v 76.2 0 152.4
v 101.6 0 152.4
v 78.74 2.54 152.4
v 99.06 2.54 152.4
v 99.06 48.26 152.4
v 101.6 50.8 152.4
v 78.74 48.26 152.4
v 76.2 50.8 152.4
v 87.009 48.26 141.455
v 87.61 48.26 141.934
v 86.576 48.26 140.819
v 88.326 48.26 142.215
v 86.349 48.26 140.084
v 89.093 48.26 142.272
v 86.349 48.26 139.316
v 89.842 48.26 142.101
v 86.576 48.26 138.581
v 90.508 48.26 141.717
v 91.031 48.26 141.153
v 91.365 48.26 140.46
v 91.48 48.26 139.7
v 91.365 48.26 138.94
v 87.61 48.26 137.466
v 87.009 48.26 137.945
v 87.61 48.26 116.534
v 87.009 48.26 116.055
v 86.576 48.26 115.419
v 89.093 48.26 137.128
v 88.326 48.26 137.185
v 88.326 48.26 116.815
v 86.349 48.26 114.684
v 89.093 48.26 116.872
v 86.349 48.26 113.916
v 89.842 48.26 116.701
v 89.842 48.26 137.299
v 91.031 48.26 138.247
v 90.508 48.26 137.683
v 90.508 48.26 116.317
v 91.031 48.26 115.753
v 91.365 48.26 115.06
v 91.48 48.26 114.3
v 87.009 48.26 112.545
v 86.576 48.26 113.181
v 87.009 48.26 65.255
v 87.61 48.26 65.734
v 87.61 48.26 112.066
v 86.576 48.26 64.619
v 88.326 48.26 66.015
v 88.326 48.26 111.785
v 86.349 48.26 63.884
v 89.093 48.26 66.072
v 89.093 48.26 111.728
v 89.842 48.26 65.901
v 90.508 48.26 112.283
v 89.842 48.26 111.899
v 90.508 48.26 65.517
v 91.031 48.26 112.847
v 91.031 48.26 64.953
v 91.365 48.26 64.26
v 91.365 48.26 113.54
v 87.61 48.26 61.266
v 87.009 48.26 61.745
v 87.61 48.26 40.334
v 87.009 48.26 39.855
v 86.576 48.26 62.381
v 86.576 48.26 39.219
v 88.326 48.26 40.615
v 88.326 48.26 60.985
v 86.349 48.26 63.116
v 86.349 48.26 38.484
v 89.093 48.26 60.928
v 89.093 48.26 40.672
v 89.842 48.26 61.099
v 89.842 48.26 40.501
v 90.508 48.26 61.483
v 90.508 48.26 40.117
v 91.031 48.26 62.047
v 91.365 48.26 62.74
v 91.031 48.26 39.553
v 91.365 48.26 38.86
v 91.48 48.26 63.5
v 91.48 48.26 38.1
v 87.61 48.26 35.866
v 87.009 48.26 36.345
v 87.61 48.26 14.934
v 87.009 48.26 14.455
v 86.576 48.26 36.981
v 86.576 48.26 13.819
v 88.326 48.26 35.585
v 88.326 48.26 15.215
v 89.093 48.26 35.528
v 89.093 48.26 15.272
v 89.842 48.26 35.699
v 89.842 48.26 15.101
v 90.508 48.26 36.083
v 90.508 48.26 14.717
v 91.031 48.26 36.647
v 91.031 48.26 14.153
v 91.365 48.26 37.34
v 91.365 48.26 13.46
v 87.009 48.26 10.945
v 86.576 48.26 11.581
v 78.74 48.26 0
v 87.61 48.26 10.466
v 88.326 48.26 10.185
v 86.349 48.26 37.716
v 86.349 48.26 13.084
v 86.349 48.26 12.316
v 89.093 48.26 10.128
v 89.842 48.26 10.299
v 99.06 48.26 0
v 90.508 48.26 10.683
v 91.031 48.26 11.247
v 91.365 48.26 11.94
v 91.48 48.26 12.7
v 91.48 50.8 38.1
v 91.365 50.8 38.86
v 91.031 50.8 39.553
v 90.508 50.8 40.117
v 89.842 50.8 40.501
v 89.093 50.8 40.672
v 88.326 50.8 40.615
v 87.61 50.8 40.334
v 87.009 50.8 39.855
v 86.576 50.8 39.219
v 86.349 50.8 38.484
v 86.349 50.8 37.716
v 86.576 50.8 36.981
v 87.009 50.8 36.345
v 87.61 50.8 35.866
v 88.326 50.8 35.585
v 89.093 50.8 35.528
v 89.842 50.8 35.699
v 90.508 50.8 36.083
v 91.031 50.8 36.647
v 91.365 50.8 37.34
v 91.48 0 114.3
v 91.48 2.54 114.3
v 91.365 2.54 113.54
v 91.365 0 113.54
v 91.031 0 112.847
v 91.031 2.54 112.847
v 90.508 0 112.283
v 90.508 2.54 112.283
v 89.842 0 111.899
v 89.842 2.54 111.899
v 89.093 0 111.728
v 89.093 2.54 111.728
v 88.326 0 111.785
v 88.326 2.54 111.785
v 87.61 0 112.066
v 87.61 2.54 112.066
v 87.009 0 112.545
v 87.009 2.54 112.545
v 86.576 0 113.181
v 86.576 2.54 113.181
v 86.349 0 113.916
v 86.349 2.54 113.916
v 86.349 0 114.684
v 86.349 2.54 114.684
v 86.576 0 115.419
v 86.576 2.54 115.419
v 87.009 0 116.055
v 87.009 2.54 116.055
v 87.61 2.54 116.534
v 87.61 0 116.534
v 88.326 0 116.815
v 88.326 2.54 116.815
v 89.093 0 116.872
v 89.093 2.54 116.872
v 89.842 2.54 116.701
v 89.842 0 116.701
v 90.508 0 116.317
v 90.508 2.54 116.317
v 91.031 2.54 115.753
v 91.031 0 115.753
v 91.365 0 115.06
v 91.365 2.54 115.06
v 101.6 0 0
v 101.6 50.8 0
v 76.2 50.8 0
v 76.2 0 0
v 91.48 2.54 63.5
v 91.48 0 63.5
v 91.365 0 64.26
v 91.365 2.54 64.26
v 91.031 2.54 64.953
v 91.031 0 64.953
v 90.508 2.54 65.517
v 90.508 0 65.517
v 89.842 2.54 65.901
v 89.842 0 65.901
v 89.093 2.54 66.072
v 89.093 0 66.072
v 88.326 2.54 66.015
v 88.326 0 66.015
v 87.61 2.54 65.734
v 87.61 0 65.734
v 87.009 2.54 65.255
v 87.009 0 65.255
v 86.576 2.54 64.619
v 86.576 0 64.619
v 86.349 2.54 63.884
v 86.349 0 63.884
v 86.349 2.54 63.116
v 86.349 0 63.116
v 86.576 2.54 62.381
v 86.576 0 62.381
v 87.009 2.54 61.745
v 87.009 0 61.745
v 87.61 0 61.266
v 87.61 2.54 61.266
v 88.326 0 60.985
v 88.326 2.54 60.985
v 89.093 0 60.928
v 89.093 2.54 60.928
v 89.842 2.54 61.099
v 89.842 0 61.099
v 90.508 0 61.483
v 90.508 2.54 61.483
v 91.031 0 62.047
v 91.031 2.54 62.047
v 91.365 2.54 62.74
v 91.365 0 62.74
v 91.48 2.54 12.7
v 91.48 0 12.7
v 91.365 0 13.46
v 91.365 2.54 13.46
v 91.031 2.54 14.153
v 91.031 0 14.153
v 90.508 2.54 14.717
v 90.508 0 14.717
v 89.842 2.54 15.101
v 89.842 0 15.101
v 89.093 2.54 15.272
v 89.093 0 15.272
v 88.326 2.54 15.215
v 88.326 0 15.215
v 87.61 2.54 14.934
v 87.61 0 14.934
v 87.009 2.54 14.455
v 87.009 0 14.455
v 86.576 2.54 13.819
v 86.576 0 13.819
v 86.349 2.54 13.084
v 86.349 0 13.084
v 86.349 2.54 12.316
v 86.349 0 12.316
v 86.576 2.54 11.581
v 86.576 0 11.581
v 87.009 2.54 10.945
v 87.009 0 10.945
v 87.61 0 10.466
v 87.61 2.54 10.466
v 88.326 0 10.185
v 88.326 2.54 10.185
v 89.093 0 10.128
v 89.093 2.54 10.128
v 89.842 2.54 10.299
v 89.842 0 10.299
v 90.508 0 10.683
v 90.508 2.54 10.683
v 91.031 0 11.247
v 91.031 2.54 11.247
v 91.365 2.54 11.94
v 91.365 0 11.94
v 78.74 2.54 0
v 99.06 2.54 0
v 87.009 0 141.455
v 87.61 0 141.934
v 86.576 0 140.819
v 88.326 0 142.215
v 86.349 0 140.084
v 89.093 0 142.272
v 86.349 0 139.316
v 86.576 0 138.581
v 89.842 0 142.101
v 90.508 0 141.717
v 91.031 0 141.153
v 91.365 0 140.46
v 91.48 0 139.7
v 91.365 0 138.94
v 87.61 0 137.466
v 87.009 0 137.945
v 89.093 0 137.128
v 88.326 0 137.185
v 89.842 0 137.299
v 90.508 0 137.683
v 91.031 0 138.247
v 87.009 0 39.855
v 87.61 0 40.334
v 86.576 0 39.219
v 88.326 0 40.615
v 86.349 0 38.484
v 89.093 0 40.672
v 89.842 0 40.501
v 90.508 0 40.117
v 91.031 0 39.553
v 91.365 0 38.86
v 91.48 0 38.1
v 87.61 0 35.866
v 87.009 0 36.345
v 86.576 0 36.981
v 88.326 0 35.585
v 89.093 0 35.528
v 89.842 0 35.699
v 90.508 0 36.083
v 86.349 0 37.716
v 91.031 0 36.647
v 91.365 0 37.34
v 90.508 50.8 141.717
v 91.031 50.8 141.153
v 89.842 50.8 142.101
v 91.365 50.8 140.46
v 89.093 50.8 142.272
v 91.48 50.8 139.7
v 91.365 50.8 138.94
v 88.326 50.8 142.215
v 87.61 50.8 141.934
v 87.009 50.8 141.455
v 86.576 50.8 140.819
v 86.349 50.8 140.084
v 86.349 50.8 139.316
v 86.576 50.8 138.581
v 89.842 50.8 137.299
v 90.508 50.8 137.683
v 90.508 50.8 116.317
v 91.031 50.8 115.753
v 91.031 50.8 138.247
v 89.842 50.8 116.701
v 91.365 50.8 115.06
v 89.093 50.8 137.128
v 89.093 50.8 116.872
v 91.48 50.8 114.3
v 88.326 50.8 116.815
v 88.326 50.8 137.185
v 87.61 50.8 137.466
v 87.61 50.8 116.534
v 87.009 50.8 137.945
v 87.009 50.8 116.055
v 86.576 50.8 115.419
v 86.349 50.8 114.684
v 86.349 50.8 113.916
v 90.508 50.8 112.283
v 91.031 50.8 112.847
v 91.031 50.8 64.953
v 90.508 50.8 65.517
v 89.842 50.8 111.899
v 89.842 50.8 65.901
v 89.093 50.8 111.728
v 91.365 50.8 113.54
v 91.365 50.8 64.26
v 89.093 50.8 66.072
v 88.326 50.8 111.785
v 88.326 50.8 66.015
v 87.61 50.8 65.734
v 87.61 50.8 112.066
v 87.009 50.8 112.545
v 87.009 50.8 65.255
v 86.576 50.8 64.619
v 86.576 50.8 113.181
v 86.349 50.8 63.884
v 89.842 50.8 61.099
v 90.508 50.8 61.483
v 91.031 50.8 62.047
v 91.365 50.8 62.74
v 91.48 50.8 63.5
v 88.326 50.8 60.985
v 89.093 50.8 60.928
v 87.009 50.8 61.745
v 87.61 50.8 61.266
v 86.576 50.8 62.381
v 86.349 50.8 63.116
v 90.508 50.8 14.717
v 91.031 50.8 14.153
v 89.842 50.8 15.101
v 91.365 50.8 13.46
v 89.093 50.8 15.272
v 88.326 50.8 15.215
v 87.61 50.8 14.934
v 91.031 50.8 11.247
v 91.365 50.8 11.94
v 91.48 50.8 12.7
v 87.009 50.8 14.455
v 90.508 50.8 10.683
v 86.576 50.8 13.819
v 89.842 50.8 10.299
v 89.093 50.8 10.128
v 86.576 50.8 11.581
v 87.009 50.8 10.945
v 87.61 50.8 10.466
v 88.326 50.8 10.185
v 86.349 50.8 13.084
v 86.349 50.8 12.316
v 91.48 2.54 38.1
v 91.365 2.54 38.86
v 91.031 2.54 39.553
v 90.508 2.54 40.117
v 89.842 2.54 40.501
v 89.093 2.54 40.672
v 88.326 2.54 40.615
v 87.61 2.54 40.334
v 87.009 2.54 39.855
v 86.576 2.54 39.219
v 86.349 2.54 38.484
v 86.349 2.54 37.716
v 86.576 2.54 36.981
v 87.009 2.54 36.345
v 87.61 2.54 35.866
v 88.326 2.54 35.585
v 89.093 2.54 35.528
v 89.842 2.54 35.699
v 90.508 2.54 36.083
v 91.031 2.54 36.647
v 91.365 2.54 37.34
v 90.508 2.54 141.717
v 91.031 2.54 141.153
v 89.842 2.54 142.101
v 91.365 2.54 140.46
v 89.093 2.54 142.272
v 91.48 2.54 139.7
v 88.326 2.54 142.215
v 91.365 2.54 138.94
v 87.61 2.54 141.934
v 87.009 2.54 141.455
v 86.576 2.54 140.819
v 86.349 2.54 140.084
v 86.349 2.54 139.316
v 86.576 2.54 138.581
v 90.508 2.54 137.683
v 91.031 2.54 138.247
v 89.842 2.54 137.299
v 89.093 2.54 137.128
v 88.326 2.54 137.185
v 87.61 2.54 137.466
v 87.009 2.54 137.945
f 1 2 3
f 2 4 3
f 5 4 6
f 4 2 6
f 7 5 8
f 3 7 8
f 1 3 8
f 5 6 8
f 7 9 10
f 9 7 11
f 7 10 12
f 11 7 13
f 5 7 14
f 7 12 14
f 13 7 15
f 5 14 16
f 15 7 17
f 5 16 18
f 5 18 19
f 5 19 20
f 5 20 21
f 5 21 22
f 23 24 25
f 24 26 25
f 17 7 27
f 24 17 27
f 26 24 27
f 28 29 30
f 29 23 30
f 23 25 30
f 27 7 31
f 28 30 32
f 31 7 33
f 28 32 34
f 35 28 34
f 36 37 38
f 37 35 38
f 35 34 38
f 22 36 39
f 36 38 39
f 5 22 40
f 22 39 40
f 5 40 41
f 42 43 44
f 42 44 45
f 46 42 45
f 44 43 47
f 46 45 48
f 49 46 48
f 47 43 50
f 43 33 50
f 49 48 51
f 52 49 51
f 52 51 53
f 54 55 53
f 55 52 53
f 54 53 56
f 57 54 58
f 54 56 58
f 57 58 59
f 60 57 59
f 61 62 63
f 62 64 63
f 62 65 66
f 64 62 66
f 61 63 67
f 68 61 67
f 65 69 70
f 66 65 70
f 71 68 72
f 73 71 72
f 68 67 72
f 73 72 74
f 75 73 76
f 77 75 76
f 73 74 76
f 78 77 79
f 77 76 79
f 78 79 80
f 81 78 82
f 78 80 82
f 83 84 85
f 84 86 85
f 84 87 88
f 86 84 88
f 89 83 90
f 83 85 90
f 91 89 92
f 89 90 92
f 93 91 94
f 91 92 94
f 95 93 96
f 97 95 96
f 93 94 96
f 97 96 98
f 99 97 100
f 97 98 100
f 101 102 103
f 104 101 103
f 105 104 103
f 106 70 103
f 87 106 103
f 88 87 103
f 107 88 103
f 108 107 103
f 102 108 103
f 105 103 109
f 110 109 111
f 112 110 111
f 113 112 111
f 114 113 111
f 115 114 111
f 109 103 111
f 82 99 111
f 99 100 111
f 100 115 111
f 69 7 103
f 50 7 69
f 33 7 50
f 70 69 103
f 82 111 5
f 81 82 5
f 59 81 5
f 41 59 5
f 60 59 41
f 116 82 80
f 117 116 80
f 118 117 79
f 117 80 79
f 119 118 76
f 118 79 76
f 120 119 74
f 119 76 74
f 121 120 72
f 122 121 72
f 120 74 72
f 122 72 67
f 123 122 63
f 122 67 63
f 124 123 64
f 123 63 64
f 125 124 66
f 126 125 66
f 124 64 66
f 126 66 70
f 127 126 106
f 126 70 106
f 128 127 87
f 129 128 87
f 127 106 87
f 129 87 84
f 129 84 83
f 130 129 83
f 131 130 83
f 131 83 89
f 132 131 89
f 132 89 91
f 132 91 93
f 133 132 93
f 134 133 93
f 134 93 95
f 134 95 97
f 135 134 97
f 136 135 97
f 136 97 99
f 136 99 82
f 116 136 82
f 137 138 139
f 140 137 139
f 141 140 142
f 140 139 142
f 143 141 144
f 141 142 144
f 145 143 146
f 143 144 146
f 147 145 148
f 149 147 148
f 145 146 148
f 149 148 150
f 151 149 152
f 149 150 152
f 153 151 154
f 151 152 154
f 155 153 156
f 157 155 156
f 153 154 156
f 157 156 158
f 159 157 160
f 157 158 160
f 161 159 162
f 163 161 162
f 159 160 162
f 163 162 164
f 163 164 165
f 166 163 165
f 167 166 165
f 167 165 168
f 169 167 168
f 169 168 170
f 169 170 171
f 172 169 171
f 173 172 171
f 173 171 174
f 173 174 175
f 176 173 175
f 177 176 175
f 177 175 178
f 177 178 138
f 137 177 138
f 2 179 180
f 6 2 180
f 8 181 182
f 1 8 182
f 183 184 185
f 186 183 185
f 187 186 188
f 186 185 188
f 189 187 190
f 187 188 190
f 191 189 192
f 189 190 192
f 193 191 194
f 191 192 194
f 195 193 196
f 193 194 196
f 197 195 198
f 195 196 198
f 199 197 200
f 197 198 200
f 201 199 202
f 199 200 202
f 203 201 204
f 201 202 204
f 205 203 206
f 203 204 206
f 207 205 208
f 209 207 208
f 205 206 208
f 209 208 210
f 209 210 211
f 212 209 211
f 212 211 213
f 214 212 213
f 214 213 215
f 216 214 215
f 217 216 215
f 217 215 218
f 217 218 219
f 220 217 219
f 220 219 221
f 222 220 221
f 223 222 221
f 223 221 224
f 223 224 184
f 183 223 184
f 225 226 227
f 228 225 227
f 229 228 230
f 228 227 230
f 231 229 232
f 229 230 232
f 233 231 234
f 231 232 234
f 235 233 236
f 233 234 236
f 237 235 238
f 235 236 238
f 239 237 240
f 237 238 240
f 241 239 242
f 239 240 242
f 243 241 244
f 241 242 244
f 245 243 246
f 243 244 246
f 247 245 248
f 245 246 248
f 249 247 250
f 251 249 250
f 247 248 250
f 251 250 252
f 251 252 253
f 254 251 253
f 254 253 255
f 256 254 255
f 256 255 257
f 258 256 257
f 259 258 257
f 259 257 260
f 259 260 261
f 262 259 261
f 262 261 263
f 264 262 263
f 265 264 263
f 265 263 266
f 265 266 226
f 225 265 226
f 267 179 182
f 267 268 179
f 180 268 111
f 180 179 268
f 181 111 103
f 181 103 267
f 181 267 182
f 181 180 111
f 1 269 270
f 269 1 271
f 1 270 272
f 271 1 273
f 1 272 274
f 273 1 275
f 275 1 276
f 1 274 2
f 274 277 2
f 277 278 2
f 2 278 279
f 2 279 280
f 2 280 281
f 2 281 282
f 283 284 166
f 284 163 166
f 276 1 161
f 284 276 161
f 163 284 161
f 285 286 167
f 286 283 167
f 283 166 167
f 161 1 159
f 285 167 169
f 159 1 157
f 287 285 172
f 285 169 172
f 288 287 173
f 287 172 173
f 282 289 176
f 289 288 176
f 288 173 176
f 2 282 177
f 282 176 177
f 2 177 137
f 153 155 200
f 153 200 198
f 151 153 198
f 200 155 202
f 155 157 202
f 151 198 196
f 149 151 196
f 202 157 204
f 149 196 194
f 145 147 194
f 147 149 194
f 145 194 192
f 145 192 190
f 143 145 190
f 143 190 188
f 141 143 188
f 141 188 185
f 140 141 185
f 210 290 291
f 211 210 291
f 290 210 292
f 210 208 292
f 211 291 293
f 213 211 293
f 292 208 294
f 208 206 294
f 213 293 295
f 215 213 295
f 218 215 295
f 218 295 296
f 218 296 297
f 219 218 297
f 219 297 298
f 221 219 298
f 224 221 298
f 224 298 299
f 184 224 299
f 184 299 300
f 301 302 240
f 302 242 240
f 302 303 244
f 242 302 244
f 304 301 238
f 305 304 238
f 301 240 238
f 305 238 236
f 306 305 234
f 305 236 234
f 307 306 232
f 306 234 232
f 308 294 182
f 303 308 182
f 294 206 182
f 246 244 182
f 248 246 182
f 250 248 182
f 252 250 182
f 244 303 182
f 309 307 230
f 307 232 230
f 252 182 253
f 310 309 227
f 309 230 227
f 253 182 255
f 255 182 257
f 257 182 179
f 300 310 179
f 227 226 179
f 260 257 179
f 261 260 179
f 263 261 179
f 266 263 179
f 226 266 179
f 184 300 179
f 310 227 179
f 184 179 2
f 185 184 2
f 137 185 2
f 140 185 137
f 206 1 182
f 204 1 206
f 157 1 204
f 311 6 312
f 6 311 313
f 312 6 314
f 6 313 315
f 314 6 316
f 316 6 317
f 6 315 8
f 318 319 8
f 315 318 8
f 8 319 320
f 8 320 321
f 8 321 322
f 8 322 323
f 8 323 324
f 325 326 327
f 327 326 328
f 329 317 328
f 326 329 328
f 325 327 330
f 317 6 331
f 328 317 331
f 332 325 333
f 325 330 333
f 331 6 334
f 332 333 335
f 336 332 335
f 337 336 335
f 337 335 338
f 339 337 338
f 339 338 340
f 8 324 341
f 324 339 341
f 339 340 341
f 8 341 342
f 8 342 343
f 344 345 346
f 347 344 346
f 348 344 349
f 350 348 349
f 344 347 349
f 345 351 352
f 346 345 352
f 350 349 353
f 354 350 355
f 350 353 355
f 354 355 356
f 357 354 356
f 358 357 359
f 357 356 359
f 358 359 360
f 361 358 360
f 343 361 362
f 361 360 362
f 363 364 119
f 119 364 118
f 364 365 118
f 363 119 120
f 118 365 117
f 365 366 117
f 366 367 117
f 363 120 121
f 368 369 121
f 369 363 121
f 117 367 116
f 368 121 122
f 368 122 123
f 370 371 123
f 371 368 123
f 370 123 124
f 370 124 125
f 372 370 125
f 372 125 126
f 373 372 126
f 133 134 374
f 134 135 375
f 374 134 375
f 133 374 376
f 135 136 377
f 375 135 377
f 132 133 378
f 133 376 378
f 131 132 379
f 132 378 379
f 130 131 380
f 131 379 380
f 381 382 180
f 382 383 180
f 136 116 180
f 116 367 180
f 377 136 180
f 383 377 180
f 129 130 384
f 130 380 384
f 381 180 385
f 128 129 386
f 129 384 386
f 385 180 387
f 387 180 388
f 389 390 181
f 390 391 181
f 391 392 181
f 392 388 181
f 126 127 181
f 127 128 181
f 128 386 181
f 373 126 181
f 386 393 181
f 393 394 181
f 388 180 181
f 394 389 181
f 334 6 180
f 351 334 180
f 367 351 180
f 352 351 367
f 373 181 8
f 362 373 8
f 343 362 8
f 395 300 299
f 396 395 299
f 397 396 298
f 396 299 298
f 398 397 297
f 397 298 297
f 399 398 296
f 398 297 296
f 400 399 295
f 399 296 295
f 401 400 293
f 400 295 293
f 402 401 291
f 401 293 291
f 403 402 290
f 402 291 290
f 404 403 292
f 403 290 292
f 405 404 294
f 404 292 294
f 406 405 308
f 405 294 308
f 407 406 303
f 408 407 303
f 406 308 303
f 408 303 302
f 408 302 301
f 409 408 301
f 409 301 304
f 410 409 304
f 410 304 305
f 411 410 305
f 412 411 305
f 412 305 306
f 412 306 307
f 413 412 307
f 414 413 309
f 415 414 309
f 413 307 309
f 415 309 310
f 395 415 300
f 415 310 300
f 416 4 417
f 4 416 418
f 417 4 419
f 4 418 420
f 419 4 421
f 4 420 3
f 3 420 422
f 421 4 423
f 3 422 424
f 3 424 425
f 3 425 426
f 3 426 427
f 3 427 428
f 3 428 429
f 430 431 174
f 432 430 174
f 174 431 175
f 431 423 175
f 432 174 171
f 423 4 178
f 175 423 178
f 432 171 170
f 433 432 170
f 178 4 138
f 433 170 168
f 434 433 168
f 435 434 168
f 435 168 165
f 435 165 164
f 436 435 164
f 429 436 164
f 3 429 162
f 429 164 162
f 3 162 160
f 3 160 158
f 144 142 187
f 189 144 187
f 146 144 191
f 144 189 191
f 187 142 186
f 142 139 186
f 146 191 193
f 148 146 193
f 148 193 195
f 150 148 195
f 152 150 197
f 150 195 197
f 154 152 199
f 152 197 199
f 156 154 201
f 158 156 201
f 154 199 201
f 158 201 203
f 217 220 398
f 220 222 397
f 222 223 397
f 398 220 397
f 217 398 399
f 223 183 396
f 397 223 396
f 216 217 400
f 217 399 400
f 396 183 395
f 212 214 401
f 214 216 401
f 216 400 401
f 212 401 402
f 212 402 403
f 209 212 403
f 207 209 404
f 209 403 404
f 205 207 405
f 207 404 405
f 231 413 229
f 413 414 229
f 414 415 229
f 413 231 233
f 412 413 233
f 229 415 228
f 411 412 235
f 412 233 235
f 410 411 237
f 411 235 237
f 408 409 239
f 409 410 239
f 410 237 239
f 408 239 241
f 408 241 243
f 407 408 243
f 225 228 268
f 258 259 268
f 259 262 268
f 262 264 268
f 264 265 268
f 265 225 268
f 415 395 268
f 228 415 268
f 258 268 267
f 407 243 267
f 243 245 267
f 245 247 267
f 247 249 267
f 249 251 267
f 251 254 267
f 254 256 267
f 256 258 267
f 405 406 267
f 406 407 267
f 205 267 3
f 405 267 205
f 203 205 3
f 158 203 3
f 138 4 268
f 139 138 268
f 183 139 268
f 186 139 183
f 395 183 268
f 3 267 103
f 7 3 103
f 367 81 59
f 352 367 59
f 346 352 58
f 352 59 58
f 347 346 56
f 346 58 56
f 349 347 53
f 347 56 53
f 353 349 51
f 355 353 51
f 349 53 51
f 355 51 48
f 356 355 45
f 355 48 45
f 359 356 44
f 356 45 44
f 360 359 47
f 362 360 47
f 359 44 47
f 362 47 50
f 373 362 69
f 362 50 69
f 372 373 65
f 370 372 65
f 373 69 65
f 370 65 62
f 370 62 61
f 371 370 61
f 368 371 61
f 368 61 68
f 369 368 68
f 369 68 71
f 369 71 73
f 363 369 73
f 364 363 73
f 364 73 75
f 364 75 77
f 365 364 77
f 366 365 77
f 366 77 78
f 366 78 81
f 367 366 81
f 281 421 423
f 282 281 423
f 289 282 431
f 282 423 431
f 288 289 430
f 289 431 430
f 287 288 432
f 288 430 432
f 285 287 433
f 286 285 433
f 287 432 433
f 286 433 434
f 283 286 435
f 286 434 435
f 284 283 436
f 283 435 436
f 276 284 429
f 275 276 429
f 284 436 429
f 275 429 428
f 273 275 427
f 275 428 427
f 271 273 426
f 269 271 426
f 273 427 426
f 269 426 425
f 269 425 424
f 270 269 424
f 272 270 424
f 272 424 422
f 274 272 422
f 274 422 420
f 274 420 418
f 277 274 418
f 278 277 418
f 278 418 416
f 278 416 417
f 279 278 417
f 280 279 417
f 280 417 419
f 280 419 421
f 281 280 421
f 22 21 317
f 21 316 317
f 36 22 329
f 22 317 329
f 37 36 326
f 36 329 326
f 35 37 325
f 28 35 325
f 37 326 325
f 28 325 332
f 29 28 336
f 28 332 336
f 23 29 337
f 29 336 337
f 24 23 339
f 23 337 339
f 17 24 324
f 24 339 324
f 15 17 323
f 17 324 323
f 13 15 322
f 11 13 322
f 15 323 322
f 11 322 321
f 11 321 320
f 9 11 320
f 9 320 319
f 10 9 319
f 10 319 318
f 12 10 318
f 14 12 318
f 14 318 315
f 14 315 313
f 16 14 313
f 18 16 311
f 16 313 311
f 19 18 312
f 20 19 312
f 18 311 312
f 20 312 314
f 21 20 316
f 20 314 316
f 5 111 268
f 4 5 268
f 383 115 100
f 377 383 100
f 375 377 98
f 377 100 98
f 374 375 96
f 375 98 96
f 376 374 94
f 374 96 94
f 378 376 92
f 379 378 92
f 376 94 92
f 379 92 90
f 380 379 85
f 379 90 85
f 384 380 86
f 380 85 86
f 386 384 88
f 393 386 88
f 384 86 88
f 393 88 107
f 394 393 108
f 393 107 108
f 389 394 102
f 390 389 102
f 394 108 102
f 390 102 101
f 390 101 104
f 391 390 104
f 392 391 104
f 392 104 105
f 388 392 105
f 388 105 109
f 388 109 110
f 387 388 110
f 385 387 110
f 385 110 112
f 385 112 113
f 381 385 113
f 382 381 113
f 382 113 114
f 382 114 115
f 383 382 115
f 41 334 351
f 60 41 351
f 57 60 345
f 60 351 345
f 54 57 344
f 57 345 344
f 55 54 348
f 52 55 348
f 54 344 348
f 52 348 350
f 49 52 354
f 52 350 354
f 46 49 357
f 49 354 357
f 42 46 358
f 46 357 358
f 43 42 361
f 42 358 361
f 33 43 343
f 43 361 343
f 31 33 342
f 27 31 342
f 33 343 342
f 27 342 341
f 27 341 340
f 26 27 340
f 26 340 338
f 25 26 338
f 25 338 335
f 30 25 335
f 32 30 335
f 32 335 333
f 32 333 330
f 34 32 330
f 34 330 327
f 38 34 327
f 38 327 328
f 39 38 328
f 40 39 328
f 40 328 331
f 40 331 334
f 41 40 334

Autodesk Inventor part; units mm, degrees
ref_plane "YZ Plane" through (0, 0, 0) normal (1, 0, 0) x (0, 1, 0)
ref_plane "XZ Plane" through (0, 0, 0) normal (0, 1, 0) x (-1, 0, 0)
ref_plane "XY Plane" through (0, 0, 0) normal (0, 0, 1) x (1, 0, 0)
ref_plane "Work Plane1" through (0, 0, 0) normal (0, 0, -1) x (-1, 0, 0)
sketch "Sketch16" plane through (0, 0, 0) normal (0, 0, -1) x (-1, 0, 0)
  line L0 (0, 0) -> (-76.2, 0) projected
  line L1 (-76.2, 0) -> (-101.6, 0)
  line L2 (-101.6, 0) -> (-101.6, 50.8)
  line L3 (-101.6, 50.8) -> (-76.2, 50.8)
  line L4 (-76.2, 50.8) -> (-76.2, 0)
  line L5 (-78.74, 48.26) -> (-99.06, 48.26)
  line L6 (-99.06, 48.26) -> (-99.06, 2.54)
  line L7 (-99.06, 2.54) -> (-78.74, 2.54)
  line L8 (-78.74, 2.54) -> (-78.74, 48.26)
  dimension "d54" = 25.4
  dimension "d55" = 50.8
  dimension "d56" = 2.54
  dimension "d57" = 2.54
  dimension "d58" = 2.54
  dimension "d59" = 2.54
extrude "Extrusion13" add sketch "Sketch16" against normal blind 152.4
ref_plane "Work Plane4" through (0, 0, 0) normal (0, 0, -1) x (-1, 0, 0)
ref_plane "Work Plane3" through (0, 0, 0) normal (0, -1, 0) x (1, 0, 0)
sketch "Sketch20" plane through (0, 0, 0) normal (0, -1, 0) x (1, 0, 0)
  circle A0 centre (88.9, 12.7) radius 2.5797
  circle A1 centre (63.5, 12.7) radius 2.5797
  circle A2 centre (38.1, 12.7) radius 2.5797
  line L0 (0, 25.4) -> (76.2, 25.4) projected
  circle A3 centre (88.9, 38.1) radius 2.5797
  circle A4 centre (88.9, 63.5) radius 2.5797
  line L1 (76.2, 25.4) -> (76.2, 152.4) projected
  line L2 (101.6, 0) -> (101.6, 152.4) projected
  point P0 (0, 0)
  dimension "d71" = 12.7
  dimension "d72" = 12.7
  dimension "d73" = 12.7
  dimension "d74" = 5.1594
  dimension "d75" = 5.1594
  dimension "d76" = 5.1594
  dimension "d77" = 12.7
  dimension "d78" = 12.7
  dimension "d79" = 5.1594
  dimension "d80" = 5.1594
  dimension "d81" = 12.7
  dimension "d82" = 25.4
  dimension "d83" = 25.4
  dimension "d84" = 25.4
  dimension "d85" = 25.4
extrude "Extrusion16" cut sketch "Sketch20" against normal blind 76.2
ref_plane "Work Plane2" through (0, 50.8, 25.4) normal (0, 1, 0) x (1, 0, 0)
sketch "Sketch24" plane through (0, 50.8, 25.4) normal (0, 1, 0) x (1, 0, 0)
  circle A0 centre (88.9, -114.3) radius 2.5797
  circle A1 centre (88.9, -88.9) radius 2.5797
  line L0 (101.6, -127) -> (76.2, -127) projected
  line L1 (76.2, 0) -> (76.2, -127) projected
  point P0 (0, 25.4)
  dimension "d112" = 12.7
  dimension "d113" = 25.4
  dimension "d114" = 5.1594
  dimension "d115" = 5.1594
  dimension "d116" = 12.7
  dimension "d117" = 12.7
extrude "Extrusion20" cut sketch "Sketch24" against normal blind 50.8
sketch "Sketch25" plane through (101.6, 0, 0) normal (1, 0, 0) x (0, 0, -1)
  point P0 (0, 0)
equation "\"d56\" = d48"
equation "\"d57\" = d48"
equation "\"d58\" = d48"
equation "\"d59\" = d48"
equation "\"d72\" = d71"
equation "\"d73\" = d71"
equation "\"d75\" = d74"
equation "\"d76\" = d74"
equation "\"d77\" = d71"
equation "\"d78\" = d71"
equation "\"d79\" = d74"
equation "\"d80\" = d74"
equation "\"d81\" = d71"
equation "\"d83\" = d82"
equation "\"d84\" = d82"
equation "\"d85\" = d82"
equation "\"d115\" = d114"
equation "\"d48\" = 2.54"
properties part number "right arm"
